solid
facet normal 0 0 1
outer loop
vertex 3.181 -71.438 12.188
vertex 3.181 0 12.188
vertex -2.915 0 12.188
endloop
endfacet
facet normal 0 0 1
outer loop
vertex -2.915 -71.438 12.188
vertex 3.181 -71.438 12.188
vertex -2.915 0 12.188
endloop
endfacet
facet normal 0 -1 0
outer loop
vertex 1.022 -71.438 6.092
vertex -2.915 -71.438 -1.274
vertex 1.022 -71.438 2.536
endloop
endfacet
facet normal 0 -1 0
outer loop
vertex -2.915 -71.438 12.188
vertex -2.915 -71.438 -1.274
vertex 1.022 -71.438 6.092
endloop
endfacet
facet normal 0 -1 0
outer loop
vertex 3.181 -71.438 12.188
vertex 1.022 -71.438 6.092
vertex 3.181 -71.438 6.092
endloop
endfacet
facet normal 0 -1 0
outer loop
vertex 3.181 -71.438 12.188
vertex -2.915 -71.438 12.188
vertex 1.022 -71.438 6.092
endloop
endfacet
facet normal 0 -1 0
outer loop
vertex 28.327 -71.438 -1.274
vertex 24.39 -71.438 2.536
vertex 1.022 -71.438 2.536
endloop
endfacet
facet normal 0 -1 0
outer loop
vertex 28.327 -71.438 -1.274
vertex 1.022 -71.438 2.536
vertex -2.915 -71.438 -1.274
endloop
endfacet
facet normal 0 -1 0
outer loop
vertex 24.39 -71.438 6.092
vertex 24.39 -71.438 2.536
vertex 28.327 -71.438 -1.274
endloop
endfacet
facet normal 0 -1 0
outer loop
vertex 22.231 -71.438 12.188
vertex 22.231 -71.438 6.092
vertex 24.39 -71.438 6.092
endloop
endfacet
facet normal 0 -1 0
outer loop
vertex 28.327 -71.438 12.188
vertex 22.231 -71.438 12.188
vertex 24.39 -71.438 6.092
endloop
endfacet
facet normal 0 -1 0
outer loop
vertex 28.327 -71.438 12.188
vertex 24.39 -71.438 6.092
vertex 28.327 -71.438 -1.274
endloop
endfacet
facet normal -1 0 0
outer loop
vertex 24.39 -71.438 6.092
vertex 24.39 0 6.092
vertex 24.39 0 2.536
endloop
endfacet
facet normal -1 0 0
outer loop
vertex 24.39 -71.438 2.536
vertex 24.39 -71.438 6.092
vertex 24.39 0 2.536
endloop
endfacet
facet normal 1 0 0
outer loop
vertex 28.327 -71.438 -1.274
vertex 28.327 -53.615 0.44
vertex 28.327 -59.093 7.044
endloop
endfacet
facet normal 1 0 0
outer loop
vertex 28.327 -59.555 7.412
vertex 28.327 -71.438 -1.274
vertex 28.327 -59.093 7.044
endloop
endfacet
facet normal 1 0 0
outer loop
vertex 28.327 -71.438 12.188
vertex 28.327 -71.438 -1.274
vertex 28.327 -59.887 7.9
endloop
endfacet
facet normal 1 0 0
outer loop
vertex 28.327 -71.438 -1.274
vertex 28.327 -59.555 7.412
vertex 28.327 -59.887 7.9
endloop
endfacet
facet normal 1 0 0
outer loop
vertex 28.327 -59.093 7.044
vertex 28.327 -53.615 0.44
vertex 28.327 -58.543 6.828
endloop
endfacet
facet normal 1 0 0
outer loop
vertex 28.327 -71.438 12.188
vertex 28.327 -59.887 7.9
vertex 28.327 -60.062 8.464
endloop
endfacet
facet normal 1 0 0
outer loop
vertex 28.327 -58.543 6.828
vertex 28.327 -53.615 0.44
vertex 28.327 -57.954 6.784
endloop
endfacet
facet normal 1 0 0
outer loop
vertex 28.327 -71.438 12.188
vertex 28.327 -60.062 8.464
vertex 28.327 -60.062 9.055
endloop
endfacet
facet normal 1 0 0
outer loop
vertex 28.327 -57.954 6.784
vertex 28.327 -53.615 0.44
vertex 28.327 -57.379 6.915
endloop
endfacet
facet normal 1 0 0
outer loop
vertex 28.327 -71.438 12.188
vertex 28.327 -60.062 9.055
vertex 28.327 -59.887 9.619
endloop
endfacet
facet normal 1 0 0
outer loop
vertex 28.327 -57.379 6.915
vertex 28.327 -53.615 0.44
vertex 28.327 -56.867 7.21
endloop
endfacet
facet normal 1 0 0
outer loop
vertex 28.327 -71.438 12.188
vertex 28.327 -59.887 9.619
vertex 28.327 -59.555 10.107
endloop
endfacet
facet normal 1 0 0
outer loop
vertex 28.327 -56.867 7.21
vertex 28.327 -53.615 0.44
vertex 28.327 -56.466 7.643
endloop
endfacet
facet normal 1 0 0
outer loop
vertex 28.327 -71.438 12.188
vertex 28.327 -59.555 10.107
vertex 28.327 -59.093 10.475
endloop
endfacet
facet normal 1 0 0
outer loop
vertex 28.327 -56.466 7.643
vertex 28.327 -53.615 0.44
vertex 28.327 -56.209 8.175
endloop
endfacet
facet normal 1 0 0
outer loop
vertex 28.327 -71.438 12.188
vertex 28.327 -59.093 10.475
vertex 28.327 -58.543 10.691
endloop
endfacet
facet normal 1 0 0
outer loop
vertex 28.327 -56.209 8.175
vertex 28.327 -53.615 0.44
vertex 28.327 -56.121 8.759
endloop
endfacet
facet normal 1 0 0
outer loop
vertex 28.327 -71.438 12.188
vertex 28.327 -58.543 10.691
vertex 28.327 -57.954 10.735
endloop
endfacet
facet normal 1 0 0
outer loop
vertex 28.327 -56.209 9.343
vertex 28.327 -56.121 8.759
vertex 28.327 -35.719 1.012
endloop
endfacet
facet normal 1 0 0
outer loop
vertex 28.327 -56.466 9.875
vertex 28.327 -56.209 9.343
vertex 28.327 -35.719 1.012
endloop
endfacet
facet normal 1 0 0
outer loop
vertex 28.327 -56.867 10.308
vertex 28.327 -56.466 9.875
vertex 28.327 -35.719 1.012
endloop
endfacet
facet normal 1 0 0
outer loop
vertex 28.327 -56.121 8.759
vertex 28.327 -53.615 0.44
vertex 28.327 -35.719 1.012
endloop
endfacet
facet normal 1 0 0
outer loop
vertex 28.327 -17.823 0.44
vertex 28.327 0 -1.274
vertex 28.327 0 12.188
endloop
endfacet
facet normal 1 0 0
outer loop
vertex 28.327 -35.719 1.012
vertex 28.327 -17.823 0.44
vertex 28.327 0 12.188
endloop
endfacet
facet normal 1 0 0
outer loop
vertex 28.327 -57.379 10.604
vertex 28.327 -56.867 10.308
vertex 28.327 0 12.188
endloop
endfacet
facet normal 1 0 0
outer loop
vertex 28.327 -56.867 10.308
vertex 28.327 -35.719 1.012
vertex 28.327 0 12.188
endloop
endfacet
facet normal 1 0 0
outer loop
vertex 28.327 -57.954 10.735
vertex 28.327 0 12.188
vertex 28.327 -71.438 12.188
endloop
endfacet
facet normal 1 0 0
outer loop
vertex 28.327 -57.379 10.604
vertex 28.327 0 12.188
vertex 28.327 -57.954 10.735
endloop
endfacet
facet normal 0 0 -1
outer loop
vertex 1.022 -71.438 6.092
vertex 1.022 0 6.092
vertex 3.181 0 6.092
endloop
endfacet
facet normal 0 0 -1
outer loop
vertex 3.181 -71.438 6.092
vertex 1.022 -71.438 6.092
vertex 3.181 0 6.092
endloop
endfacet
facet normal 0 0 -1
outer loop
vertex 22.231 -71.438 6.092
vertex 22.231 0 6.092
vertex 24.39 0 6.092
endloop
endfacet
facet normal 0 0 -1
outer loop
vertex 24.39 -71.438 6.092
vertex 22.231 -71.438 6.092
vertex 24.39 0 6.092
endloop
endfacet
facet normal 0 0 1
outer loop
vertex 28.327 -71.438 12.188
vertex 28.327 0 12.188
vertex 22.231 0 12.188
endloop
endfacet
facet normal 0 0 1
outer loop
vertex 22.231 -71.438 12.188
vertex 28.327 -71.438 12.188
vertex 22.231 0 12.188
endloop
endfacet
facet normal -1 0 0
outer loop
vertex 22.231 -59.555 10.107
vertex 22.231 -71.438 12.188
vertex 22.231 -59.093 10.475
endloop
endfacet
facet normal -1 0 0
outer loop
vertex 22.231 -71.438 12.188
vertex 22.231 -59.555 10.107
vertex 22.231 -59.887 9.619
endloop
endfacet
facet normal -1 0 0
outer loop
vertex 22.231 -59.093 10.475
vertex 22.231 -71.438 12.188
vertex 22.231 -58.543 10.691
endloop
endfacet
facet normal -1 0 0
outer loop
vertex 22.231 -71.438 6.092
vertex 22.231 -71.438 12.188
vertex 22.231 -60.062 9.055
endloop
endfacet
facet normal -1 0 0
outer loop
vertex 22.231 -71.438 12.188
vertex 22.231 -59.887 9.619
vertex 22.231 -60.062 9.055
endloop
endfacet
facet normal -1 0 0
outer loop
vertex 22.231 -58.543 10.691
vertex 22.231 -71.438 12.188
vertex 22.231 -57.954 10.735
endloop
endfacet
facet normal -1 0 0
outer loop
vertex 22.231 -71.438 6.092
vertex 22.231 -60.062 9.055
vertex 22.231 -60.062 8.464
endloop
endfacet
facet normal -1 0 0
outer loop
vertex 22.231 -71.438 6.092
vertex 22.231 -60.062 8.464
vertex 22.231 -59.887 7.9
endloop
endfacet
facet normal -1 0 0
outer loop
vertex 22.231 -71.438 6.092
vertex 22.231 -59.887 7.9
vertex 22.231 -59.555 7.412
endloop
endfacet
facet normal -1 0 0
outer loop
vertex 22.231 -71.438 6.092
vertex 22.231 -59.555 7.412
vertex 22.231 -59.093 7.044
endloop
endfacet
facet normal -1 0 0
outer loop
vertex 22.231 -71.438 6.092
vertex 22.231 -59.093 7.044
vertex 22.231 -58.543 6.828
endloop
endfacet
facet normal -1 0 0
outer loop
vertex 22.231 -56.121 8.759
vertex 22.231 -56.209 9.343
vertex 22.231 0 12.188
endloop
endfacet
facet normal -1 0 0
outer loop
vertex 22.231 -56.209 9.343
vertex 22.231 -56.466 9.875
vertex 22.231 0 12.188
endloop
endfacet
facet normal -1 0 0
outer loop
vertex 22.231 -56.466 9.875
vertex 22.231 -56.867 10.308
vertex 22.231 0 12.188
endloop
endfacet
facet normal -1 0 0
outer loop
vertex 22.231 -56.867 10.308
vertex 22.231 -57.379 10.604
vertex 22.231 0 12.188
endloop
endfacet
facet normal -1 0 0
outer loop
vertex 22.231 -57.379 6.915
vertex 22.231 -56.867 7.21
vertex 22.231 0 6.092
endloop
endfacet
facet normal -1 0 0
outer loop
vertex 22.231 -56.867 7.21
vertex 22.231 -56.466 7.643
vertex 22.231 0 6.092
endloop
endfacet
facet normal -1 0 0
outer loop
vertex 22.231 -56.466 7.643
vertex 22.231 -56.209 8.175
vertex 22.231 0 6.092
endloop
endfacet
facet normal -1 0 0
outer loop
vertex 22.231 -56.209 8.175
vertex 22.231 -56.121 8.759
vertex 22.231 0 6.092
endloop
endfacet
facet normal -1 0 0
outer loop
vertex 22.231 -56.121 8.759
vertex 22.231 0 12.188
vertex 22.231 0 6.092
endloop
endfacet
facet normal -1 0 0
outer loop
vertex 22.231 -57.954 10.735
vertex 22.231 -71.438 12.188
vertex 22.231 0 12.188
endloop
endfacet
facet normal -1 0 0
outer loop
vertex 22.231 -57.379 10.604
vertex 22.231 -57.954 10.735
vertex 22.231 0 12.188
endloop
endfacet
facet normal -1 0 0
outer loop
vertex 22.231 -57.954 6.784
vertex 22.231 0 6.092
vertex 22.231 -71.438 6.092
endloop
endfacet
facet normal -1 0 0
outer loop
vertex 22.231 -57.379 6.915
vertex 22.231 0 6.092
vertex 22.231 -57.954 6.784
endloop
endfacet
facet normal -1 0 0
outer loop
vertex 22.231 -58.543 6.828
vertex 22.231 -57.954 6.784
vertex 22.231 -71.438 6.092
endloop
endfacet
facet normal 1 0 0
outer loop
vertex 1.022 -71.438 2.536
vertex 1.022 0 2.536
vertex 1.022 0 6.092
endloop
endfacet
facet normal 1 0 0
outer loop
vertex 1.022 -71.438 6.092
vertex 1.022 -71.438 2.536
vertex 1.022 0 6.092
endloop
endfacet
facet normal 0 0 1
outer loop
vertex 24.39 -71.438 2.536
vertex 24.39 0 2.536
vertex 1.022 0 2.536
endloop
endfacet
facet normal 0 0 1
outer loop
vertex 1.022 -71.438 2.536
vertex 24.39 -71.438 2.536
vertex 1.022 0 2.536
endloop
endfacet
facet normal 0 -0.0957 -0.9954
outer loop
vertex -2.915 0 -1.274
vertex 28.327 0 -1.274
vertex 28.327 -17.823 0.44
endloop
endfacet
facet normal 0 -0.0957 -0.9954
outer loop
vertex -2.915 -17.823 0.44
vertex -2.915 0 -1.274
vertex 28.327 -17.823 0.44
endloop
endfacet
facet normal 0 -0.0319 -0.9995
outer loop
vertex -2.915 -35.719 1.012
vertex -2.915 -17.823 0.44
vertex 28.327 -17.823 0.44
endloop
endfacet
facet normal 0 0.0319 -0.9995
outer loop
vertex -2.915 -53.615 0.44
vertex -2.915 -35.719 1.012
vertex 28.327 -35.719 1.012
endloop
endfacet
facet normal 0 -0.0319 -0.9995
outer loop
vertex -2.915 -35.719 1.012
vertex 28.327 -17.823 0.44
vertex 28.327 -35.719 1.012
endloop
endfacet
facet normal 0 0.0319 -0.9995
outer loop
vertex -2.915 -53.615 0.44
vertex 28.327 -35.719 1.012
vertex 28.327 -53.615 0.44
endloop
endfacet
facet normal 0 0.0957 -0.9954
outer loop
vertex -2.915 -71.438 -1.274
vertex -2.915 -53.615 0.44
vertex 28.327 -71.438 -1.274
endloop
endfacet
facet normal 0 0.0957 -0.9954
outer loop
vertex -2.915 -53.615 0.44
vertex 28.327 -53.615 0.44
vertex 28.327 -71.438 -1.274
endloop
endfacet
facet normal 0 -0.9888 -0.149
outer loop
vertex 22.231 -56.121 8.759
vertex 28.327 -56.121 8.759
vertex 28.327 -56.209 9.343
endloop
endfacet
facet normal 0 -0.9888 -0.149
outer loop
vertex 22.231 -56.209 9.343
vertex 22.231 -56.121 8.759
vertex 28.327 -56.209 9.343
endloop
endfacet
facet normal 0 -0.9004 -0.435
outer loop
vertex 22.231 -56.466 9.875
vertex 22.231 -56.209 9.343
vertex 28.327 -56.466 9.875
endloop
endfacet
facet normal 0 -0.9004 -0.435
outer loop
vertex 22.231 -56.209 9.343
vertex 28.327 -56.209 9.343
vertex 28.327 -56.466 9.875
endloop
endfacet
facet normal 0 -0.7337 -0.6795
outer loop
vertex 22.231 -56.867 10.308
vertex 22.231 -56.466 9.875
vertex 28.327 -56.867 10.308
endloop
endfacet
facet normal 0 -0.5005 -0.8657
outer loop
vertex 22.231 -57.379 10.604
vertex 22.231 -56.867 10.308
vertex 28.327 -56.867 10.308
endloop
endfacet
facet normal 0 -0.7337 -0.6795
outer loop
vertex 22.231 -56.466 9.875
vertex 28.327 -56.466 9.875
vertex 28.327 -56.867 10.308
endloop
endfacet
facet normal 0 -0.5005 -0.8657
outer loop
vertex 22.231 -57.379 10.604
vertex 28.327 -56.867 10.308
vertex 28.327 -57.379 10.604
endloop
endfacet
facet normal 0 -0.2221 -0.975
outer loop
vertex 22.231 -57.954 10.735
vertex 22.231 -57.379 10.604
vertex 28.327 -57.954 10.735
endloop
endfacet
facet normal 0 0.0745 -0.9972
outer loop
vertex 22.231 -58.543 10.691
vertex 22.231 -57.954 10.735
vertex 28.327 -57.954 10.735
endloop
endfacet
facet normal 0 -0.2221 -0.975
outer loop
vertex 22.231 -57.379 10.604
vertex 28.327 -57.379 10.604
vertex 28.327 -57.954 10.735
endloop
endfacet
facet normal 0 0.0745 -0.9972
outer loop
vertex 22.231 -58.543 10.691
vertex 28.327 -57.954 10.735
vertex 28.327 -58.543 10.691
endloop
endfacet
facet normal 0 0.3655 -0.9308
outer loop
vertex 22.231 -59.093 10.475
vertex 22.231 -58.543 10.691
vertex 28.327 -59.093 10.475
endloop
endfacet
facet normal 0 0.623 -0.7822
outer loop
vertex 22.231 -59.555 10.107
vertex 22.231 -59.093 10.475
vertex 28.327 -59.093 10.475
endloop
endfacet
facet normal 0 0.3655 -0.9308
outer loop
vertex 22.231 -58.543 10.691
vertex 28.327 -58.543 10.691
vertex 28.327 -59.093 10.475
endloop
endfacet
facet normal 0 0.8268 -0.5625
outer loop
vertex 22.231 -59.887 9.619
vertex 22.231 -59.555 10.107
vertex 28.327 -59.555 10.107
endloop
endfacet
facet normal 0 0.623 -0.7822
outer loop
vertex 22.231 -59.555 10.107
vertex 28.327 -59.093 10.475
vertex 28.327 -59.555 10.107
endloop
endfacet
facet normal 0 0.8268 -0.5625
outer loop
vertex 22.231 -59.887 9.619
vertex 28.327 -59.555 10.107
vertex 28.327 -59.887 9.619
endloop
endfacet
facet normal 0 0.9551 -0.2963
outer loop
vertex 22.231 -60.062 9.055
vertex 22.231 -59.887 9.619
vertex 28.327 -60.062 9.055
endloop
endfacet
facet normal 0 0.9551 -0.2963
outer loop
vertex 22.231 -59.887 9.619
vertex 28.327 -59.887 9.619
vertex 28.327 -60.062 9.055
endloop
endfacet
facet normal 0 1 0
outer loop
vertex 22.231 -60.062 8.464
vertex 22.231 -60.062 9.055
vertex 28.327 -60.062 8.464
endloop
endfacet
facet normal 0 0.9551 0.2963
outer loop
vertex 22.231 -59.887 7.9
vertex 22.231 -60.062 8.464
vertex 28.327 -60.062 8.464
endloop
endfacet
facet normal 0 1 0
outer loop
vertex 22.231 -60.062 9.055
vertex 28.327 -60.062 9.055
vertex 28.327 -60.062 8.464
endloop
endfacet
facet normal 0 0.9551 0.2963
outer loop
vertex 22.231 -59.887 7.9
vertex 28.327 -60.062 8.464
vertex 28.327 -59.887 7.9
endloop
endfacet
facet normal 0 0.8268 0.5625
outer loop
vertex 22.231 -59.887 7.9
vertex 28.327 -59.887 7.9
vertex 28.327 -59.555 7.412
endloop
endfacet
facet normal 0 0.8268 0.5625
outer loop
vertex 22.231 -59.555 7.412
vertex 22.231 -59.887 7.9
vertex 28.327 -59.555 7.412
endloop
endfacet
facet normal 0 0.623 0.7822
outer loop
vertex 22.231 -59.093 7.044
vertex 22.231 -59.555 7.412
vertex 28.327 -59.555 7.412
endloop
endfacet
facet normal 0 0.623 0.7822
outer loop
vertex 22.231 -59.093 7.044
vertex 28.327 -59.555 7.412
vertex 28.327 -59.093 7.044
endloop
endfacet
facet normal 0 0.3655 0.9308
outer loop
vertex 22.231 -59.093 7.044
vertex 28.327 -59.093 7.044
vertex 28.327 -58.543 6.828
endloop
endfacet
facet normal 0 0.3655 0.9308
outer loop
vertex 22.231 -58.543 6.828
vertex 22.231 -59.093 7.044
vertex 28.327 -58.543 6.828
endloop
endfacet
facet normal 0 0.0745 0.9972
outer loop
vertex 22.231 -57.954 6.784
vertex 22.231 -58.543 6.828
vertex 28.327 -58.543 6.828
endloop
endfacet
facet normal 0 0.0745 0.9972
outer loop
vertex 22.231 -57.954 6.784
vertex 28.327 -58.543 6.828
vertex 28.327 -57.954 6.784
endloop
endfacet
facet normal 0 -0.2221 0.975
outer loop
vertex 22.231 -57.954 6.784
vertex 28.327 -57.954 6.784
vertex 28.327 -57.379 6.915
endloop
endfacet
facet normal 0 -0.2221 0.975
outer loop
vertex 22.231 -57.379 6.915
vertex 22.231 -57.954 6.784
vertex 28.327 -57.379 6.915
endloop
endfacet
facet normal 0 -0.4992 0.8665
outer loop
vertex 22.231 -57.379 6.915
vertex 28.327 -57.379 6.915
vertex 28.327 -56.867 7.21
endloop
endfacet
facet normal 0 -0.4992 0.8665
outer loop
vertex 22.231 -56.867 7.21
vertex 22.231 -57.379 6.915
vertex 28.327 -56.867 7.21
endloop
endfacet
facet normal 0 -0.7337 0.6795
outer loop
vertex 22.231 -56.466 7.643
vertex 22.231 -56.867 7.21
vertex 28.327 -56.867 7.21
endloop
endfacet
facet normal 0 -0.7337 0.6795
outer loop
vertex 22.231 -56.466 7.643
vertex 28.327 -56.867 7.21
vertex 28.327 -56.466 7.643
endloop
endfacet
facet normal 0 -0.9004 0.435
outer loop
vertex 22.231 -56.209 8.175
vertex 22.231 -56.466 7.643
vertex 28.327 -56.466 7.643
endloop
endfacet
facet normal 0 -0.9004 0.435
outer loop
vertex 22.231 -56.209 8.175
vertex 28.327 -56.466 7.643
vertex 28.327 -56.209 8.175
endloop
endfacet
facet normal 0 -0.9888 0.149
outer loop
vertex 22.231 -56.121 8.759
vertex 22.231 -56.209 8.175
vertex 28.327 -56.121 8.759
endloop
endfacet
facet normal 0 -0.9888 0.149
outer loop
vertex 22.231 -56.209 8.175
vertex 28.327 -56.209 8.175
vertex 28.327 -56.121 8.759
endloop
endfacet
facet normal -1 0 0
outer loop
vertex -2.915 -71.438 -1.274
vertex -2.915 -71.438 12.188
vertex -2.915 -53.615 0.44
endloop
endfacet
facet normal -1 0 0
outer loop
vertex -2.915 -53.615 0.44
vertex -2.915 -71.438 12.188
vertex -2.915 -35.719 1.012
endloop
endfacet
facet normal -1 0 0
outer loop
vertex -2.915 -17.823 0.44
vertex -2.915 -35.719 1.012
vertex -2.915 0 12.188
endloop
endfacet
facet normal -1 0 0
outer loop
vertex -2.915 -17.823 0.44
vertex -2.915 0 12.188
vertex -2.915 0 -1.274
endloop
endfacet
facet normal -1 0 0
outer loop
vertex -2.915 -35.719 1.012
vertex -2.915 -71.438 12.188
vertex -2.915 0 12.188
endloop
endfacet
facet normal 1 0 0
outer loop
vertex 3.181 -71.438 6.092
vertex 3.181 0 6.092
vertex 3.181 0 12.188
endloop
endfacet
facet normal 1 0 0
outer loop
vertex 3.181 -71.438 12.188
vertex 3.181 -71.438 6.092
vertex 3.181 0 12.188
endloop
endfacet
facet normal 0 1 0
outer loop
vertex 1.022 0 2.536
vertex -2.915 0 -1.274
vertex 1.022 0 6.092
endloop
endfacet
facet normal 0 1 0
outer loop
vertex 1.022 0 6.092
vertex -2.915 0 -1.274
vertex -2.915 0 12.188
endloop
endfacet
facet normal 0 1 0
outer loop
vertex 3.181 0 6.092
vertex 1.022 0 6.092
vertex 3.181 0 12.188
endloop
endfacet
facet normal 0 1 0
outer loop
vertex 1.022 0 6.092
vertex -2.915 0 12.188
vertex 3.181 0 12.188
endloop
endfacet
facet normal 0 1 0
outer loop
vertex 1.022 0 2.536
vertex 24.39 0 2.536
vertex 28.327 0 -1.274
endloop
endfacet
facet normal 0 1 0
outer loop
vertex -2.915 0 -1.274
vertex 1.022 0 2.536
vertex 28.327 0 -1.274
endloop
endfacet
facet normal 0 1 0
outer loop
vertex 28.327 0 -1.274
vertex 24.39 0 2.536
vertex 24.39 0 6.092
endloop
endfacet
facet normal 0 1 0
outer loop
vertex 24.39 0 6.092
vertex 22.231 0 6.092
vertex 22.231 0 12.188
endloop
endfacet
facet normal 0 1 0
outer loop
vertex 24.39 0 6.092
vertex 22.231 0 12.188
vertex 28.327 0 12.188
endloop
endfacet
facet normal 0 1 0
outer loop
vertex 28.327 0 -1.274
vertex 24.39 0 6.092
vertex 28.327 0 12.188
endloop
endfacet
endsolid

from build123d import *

# Parameters (mm, degrees)
F1_DEPTH = 71.4375
F2_R     = 1.9812
F3_DEPTH = 6.096
F5_DEPTH = 31.243


# Not quite as in the source:
# - a feature names something its author has since deleted; it is built from what else it names


with BuildPart() as f1:
    # F0 (on Front) → F1 (new body)
    with BuildSketch(Plane.XZ):
        Polygon((3.1813341729, 6.0924417882), (3.1813341729, 12.1884417882), (-2.9146658271, 12.1884417882), (-2.9146658271, -1.2735582118), (28.3273341729, -1.2735582118), (28.3273341729, 12.1884417882), (22.2313341729, 12.1884417882), (22.2313341729, 6.0924417882), (24.3903341729, 6.0924417882), (24.3903341729, 2.5364417882), (1.0223341729, 2.5364417882), (1.0223341729, 6.0924417882), align=None)
    extrude(amount=F1_DEPTH)

    # F2 (on face) → F3 (cut, through all)
    with BuildSketch(Plane.YZ.offset(28.3273341729)):
        with Locations((-58.1025, 8.7594417882)):
            Circle(F2_R)
    extrude(amount=-F3_DEPTH, mode=Mode.SUBTRACT)

    # F4 (on face) → F5 (cut, through all)
    with BuildSketch(Plane.YZ.offset(28.3273341729)):
        with BuildLine():
            ThreePointArc((0, -1.2735582118), (-35.71875, 1.0124417882), (-71.4375, -1.2735582118))
            Line((-71.4375, -1.2735582118), (0, -1.2735582118))
        make_face()
    extrude(amount=-F5_DEPTH, mode=Mode.SUBTRACT)


solid = f1.part
